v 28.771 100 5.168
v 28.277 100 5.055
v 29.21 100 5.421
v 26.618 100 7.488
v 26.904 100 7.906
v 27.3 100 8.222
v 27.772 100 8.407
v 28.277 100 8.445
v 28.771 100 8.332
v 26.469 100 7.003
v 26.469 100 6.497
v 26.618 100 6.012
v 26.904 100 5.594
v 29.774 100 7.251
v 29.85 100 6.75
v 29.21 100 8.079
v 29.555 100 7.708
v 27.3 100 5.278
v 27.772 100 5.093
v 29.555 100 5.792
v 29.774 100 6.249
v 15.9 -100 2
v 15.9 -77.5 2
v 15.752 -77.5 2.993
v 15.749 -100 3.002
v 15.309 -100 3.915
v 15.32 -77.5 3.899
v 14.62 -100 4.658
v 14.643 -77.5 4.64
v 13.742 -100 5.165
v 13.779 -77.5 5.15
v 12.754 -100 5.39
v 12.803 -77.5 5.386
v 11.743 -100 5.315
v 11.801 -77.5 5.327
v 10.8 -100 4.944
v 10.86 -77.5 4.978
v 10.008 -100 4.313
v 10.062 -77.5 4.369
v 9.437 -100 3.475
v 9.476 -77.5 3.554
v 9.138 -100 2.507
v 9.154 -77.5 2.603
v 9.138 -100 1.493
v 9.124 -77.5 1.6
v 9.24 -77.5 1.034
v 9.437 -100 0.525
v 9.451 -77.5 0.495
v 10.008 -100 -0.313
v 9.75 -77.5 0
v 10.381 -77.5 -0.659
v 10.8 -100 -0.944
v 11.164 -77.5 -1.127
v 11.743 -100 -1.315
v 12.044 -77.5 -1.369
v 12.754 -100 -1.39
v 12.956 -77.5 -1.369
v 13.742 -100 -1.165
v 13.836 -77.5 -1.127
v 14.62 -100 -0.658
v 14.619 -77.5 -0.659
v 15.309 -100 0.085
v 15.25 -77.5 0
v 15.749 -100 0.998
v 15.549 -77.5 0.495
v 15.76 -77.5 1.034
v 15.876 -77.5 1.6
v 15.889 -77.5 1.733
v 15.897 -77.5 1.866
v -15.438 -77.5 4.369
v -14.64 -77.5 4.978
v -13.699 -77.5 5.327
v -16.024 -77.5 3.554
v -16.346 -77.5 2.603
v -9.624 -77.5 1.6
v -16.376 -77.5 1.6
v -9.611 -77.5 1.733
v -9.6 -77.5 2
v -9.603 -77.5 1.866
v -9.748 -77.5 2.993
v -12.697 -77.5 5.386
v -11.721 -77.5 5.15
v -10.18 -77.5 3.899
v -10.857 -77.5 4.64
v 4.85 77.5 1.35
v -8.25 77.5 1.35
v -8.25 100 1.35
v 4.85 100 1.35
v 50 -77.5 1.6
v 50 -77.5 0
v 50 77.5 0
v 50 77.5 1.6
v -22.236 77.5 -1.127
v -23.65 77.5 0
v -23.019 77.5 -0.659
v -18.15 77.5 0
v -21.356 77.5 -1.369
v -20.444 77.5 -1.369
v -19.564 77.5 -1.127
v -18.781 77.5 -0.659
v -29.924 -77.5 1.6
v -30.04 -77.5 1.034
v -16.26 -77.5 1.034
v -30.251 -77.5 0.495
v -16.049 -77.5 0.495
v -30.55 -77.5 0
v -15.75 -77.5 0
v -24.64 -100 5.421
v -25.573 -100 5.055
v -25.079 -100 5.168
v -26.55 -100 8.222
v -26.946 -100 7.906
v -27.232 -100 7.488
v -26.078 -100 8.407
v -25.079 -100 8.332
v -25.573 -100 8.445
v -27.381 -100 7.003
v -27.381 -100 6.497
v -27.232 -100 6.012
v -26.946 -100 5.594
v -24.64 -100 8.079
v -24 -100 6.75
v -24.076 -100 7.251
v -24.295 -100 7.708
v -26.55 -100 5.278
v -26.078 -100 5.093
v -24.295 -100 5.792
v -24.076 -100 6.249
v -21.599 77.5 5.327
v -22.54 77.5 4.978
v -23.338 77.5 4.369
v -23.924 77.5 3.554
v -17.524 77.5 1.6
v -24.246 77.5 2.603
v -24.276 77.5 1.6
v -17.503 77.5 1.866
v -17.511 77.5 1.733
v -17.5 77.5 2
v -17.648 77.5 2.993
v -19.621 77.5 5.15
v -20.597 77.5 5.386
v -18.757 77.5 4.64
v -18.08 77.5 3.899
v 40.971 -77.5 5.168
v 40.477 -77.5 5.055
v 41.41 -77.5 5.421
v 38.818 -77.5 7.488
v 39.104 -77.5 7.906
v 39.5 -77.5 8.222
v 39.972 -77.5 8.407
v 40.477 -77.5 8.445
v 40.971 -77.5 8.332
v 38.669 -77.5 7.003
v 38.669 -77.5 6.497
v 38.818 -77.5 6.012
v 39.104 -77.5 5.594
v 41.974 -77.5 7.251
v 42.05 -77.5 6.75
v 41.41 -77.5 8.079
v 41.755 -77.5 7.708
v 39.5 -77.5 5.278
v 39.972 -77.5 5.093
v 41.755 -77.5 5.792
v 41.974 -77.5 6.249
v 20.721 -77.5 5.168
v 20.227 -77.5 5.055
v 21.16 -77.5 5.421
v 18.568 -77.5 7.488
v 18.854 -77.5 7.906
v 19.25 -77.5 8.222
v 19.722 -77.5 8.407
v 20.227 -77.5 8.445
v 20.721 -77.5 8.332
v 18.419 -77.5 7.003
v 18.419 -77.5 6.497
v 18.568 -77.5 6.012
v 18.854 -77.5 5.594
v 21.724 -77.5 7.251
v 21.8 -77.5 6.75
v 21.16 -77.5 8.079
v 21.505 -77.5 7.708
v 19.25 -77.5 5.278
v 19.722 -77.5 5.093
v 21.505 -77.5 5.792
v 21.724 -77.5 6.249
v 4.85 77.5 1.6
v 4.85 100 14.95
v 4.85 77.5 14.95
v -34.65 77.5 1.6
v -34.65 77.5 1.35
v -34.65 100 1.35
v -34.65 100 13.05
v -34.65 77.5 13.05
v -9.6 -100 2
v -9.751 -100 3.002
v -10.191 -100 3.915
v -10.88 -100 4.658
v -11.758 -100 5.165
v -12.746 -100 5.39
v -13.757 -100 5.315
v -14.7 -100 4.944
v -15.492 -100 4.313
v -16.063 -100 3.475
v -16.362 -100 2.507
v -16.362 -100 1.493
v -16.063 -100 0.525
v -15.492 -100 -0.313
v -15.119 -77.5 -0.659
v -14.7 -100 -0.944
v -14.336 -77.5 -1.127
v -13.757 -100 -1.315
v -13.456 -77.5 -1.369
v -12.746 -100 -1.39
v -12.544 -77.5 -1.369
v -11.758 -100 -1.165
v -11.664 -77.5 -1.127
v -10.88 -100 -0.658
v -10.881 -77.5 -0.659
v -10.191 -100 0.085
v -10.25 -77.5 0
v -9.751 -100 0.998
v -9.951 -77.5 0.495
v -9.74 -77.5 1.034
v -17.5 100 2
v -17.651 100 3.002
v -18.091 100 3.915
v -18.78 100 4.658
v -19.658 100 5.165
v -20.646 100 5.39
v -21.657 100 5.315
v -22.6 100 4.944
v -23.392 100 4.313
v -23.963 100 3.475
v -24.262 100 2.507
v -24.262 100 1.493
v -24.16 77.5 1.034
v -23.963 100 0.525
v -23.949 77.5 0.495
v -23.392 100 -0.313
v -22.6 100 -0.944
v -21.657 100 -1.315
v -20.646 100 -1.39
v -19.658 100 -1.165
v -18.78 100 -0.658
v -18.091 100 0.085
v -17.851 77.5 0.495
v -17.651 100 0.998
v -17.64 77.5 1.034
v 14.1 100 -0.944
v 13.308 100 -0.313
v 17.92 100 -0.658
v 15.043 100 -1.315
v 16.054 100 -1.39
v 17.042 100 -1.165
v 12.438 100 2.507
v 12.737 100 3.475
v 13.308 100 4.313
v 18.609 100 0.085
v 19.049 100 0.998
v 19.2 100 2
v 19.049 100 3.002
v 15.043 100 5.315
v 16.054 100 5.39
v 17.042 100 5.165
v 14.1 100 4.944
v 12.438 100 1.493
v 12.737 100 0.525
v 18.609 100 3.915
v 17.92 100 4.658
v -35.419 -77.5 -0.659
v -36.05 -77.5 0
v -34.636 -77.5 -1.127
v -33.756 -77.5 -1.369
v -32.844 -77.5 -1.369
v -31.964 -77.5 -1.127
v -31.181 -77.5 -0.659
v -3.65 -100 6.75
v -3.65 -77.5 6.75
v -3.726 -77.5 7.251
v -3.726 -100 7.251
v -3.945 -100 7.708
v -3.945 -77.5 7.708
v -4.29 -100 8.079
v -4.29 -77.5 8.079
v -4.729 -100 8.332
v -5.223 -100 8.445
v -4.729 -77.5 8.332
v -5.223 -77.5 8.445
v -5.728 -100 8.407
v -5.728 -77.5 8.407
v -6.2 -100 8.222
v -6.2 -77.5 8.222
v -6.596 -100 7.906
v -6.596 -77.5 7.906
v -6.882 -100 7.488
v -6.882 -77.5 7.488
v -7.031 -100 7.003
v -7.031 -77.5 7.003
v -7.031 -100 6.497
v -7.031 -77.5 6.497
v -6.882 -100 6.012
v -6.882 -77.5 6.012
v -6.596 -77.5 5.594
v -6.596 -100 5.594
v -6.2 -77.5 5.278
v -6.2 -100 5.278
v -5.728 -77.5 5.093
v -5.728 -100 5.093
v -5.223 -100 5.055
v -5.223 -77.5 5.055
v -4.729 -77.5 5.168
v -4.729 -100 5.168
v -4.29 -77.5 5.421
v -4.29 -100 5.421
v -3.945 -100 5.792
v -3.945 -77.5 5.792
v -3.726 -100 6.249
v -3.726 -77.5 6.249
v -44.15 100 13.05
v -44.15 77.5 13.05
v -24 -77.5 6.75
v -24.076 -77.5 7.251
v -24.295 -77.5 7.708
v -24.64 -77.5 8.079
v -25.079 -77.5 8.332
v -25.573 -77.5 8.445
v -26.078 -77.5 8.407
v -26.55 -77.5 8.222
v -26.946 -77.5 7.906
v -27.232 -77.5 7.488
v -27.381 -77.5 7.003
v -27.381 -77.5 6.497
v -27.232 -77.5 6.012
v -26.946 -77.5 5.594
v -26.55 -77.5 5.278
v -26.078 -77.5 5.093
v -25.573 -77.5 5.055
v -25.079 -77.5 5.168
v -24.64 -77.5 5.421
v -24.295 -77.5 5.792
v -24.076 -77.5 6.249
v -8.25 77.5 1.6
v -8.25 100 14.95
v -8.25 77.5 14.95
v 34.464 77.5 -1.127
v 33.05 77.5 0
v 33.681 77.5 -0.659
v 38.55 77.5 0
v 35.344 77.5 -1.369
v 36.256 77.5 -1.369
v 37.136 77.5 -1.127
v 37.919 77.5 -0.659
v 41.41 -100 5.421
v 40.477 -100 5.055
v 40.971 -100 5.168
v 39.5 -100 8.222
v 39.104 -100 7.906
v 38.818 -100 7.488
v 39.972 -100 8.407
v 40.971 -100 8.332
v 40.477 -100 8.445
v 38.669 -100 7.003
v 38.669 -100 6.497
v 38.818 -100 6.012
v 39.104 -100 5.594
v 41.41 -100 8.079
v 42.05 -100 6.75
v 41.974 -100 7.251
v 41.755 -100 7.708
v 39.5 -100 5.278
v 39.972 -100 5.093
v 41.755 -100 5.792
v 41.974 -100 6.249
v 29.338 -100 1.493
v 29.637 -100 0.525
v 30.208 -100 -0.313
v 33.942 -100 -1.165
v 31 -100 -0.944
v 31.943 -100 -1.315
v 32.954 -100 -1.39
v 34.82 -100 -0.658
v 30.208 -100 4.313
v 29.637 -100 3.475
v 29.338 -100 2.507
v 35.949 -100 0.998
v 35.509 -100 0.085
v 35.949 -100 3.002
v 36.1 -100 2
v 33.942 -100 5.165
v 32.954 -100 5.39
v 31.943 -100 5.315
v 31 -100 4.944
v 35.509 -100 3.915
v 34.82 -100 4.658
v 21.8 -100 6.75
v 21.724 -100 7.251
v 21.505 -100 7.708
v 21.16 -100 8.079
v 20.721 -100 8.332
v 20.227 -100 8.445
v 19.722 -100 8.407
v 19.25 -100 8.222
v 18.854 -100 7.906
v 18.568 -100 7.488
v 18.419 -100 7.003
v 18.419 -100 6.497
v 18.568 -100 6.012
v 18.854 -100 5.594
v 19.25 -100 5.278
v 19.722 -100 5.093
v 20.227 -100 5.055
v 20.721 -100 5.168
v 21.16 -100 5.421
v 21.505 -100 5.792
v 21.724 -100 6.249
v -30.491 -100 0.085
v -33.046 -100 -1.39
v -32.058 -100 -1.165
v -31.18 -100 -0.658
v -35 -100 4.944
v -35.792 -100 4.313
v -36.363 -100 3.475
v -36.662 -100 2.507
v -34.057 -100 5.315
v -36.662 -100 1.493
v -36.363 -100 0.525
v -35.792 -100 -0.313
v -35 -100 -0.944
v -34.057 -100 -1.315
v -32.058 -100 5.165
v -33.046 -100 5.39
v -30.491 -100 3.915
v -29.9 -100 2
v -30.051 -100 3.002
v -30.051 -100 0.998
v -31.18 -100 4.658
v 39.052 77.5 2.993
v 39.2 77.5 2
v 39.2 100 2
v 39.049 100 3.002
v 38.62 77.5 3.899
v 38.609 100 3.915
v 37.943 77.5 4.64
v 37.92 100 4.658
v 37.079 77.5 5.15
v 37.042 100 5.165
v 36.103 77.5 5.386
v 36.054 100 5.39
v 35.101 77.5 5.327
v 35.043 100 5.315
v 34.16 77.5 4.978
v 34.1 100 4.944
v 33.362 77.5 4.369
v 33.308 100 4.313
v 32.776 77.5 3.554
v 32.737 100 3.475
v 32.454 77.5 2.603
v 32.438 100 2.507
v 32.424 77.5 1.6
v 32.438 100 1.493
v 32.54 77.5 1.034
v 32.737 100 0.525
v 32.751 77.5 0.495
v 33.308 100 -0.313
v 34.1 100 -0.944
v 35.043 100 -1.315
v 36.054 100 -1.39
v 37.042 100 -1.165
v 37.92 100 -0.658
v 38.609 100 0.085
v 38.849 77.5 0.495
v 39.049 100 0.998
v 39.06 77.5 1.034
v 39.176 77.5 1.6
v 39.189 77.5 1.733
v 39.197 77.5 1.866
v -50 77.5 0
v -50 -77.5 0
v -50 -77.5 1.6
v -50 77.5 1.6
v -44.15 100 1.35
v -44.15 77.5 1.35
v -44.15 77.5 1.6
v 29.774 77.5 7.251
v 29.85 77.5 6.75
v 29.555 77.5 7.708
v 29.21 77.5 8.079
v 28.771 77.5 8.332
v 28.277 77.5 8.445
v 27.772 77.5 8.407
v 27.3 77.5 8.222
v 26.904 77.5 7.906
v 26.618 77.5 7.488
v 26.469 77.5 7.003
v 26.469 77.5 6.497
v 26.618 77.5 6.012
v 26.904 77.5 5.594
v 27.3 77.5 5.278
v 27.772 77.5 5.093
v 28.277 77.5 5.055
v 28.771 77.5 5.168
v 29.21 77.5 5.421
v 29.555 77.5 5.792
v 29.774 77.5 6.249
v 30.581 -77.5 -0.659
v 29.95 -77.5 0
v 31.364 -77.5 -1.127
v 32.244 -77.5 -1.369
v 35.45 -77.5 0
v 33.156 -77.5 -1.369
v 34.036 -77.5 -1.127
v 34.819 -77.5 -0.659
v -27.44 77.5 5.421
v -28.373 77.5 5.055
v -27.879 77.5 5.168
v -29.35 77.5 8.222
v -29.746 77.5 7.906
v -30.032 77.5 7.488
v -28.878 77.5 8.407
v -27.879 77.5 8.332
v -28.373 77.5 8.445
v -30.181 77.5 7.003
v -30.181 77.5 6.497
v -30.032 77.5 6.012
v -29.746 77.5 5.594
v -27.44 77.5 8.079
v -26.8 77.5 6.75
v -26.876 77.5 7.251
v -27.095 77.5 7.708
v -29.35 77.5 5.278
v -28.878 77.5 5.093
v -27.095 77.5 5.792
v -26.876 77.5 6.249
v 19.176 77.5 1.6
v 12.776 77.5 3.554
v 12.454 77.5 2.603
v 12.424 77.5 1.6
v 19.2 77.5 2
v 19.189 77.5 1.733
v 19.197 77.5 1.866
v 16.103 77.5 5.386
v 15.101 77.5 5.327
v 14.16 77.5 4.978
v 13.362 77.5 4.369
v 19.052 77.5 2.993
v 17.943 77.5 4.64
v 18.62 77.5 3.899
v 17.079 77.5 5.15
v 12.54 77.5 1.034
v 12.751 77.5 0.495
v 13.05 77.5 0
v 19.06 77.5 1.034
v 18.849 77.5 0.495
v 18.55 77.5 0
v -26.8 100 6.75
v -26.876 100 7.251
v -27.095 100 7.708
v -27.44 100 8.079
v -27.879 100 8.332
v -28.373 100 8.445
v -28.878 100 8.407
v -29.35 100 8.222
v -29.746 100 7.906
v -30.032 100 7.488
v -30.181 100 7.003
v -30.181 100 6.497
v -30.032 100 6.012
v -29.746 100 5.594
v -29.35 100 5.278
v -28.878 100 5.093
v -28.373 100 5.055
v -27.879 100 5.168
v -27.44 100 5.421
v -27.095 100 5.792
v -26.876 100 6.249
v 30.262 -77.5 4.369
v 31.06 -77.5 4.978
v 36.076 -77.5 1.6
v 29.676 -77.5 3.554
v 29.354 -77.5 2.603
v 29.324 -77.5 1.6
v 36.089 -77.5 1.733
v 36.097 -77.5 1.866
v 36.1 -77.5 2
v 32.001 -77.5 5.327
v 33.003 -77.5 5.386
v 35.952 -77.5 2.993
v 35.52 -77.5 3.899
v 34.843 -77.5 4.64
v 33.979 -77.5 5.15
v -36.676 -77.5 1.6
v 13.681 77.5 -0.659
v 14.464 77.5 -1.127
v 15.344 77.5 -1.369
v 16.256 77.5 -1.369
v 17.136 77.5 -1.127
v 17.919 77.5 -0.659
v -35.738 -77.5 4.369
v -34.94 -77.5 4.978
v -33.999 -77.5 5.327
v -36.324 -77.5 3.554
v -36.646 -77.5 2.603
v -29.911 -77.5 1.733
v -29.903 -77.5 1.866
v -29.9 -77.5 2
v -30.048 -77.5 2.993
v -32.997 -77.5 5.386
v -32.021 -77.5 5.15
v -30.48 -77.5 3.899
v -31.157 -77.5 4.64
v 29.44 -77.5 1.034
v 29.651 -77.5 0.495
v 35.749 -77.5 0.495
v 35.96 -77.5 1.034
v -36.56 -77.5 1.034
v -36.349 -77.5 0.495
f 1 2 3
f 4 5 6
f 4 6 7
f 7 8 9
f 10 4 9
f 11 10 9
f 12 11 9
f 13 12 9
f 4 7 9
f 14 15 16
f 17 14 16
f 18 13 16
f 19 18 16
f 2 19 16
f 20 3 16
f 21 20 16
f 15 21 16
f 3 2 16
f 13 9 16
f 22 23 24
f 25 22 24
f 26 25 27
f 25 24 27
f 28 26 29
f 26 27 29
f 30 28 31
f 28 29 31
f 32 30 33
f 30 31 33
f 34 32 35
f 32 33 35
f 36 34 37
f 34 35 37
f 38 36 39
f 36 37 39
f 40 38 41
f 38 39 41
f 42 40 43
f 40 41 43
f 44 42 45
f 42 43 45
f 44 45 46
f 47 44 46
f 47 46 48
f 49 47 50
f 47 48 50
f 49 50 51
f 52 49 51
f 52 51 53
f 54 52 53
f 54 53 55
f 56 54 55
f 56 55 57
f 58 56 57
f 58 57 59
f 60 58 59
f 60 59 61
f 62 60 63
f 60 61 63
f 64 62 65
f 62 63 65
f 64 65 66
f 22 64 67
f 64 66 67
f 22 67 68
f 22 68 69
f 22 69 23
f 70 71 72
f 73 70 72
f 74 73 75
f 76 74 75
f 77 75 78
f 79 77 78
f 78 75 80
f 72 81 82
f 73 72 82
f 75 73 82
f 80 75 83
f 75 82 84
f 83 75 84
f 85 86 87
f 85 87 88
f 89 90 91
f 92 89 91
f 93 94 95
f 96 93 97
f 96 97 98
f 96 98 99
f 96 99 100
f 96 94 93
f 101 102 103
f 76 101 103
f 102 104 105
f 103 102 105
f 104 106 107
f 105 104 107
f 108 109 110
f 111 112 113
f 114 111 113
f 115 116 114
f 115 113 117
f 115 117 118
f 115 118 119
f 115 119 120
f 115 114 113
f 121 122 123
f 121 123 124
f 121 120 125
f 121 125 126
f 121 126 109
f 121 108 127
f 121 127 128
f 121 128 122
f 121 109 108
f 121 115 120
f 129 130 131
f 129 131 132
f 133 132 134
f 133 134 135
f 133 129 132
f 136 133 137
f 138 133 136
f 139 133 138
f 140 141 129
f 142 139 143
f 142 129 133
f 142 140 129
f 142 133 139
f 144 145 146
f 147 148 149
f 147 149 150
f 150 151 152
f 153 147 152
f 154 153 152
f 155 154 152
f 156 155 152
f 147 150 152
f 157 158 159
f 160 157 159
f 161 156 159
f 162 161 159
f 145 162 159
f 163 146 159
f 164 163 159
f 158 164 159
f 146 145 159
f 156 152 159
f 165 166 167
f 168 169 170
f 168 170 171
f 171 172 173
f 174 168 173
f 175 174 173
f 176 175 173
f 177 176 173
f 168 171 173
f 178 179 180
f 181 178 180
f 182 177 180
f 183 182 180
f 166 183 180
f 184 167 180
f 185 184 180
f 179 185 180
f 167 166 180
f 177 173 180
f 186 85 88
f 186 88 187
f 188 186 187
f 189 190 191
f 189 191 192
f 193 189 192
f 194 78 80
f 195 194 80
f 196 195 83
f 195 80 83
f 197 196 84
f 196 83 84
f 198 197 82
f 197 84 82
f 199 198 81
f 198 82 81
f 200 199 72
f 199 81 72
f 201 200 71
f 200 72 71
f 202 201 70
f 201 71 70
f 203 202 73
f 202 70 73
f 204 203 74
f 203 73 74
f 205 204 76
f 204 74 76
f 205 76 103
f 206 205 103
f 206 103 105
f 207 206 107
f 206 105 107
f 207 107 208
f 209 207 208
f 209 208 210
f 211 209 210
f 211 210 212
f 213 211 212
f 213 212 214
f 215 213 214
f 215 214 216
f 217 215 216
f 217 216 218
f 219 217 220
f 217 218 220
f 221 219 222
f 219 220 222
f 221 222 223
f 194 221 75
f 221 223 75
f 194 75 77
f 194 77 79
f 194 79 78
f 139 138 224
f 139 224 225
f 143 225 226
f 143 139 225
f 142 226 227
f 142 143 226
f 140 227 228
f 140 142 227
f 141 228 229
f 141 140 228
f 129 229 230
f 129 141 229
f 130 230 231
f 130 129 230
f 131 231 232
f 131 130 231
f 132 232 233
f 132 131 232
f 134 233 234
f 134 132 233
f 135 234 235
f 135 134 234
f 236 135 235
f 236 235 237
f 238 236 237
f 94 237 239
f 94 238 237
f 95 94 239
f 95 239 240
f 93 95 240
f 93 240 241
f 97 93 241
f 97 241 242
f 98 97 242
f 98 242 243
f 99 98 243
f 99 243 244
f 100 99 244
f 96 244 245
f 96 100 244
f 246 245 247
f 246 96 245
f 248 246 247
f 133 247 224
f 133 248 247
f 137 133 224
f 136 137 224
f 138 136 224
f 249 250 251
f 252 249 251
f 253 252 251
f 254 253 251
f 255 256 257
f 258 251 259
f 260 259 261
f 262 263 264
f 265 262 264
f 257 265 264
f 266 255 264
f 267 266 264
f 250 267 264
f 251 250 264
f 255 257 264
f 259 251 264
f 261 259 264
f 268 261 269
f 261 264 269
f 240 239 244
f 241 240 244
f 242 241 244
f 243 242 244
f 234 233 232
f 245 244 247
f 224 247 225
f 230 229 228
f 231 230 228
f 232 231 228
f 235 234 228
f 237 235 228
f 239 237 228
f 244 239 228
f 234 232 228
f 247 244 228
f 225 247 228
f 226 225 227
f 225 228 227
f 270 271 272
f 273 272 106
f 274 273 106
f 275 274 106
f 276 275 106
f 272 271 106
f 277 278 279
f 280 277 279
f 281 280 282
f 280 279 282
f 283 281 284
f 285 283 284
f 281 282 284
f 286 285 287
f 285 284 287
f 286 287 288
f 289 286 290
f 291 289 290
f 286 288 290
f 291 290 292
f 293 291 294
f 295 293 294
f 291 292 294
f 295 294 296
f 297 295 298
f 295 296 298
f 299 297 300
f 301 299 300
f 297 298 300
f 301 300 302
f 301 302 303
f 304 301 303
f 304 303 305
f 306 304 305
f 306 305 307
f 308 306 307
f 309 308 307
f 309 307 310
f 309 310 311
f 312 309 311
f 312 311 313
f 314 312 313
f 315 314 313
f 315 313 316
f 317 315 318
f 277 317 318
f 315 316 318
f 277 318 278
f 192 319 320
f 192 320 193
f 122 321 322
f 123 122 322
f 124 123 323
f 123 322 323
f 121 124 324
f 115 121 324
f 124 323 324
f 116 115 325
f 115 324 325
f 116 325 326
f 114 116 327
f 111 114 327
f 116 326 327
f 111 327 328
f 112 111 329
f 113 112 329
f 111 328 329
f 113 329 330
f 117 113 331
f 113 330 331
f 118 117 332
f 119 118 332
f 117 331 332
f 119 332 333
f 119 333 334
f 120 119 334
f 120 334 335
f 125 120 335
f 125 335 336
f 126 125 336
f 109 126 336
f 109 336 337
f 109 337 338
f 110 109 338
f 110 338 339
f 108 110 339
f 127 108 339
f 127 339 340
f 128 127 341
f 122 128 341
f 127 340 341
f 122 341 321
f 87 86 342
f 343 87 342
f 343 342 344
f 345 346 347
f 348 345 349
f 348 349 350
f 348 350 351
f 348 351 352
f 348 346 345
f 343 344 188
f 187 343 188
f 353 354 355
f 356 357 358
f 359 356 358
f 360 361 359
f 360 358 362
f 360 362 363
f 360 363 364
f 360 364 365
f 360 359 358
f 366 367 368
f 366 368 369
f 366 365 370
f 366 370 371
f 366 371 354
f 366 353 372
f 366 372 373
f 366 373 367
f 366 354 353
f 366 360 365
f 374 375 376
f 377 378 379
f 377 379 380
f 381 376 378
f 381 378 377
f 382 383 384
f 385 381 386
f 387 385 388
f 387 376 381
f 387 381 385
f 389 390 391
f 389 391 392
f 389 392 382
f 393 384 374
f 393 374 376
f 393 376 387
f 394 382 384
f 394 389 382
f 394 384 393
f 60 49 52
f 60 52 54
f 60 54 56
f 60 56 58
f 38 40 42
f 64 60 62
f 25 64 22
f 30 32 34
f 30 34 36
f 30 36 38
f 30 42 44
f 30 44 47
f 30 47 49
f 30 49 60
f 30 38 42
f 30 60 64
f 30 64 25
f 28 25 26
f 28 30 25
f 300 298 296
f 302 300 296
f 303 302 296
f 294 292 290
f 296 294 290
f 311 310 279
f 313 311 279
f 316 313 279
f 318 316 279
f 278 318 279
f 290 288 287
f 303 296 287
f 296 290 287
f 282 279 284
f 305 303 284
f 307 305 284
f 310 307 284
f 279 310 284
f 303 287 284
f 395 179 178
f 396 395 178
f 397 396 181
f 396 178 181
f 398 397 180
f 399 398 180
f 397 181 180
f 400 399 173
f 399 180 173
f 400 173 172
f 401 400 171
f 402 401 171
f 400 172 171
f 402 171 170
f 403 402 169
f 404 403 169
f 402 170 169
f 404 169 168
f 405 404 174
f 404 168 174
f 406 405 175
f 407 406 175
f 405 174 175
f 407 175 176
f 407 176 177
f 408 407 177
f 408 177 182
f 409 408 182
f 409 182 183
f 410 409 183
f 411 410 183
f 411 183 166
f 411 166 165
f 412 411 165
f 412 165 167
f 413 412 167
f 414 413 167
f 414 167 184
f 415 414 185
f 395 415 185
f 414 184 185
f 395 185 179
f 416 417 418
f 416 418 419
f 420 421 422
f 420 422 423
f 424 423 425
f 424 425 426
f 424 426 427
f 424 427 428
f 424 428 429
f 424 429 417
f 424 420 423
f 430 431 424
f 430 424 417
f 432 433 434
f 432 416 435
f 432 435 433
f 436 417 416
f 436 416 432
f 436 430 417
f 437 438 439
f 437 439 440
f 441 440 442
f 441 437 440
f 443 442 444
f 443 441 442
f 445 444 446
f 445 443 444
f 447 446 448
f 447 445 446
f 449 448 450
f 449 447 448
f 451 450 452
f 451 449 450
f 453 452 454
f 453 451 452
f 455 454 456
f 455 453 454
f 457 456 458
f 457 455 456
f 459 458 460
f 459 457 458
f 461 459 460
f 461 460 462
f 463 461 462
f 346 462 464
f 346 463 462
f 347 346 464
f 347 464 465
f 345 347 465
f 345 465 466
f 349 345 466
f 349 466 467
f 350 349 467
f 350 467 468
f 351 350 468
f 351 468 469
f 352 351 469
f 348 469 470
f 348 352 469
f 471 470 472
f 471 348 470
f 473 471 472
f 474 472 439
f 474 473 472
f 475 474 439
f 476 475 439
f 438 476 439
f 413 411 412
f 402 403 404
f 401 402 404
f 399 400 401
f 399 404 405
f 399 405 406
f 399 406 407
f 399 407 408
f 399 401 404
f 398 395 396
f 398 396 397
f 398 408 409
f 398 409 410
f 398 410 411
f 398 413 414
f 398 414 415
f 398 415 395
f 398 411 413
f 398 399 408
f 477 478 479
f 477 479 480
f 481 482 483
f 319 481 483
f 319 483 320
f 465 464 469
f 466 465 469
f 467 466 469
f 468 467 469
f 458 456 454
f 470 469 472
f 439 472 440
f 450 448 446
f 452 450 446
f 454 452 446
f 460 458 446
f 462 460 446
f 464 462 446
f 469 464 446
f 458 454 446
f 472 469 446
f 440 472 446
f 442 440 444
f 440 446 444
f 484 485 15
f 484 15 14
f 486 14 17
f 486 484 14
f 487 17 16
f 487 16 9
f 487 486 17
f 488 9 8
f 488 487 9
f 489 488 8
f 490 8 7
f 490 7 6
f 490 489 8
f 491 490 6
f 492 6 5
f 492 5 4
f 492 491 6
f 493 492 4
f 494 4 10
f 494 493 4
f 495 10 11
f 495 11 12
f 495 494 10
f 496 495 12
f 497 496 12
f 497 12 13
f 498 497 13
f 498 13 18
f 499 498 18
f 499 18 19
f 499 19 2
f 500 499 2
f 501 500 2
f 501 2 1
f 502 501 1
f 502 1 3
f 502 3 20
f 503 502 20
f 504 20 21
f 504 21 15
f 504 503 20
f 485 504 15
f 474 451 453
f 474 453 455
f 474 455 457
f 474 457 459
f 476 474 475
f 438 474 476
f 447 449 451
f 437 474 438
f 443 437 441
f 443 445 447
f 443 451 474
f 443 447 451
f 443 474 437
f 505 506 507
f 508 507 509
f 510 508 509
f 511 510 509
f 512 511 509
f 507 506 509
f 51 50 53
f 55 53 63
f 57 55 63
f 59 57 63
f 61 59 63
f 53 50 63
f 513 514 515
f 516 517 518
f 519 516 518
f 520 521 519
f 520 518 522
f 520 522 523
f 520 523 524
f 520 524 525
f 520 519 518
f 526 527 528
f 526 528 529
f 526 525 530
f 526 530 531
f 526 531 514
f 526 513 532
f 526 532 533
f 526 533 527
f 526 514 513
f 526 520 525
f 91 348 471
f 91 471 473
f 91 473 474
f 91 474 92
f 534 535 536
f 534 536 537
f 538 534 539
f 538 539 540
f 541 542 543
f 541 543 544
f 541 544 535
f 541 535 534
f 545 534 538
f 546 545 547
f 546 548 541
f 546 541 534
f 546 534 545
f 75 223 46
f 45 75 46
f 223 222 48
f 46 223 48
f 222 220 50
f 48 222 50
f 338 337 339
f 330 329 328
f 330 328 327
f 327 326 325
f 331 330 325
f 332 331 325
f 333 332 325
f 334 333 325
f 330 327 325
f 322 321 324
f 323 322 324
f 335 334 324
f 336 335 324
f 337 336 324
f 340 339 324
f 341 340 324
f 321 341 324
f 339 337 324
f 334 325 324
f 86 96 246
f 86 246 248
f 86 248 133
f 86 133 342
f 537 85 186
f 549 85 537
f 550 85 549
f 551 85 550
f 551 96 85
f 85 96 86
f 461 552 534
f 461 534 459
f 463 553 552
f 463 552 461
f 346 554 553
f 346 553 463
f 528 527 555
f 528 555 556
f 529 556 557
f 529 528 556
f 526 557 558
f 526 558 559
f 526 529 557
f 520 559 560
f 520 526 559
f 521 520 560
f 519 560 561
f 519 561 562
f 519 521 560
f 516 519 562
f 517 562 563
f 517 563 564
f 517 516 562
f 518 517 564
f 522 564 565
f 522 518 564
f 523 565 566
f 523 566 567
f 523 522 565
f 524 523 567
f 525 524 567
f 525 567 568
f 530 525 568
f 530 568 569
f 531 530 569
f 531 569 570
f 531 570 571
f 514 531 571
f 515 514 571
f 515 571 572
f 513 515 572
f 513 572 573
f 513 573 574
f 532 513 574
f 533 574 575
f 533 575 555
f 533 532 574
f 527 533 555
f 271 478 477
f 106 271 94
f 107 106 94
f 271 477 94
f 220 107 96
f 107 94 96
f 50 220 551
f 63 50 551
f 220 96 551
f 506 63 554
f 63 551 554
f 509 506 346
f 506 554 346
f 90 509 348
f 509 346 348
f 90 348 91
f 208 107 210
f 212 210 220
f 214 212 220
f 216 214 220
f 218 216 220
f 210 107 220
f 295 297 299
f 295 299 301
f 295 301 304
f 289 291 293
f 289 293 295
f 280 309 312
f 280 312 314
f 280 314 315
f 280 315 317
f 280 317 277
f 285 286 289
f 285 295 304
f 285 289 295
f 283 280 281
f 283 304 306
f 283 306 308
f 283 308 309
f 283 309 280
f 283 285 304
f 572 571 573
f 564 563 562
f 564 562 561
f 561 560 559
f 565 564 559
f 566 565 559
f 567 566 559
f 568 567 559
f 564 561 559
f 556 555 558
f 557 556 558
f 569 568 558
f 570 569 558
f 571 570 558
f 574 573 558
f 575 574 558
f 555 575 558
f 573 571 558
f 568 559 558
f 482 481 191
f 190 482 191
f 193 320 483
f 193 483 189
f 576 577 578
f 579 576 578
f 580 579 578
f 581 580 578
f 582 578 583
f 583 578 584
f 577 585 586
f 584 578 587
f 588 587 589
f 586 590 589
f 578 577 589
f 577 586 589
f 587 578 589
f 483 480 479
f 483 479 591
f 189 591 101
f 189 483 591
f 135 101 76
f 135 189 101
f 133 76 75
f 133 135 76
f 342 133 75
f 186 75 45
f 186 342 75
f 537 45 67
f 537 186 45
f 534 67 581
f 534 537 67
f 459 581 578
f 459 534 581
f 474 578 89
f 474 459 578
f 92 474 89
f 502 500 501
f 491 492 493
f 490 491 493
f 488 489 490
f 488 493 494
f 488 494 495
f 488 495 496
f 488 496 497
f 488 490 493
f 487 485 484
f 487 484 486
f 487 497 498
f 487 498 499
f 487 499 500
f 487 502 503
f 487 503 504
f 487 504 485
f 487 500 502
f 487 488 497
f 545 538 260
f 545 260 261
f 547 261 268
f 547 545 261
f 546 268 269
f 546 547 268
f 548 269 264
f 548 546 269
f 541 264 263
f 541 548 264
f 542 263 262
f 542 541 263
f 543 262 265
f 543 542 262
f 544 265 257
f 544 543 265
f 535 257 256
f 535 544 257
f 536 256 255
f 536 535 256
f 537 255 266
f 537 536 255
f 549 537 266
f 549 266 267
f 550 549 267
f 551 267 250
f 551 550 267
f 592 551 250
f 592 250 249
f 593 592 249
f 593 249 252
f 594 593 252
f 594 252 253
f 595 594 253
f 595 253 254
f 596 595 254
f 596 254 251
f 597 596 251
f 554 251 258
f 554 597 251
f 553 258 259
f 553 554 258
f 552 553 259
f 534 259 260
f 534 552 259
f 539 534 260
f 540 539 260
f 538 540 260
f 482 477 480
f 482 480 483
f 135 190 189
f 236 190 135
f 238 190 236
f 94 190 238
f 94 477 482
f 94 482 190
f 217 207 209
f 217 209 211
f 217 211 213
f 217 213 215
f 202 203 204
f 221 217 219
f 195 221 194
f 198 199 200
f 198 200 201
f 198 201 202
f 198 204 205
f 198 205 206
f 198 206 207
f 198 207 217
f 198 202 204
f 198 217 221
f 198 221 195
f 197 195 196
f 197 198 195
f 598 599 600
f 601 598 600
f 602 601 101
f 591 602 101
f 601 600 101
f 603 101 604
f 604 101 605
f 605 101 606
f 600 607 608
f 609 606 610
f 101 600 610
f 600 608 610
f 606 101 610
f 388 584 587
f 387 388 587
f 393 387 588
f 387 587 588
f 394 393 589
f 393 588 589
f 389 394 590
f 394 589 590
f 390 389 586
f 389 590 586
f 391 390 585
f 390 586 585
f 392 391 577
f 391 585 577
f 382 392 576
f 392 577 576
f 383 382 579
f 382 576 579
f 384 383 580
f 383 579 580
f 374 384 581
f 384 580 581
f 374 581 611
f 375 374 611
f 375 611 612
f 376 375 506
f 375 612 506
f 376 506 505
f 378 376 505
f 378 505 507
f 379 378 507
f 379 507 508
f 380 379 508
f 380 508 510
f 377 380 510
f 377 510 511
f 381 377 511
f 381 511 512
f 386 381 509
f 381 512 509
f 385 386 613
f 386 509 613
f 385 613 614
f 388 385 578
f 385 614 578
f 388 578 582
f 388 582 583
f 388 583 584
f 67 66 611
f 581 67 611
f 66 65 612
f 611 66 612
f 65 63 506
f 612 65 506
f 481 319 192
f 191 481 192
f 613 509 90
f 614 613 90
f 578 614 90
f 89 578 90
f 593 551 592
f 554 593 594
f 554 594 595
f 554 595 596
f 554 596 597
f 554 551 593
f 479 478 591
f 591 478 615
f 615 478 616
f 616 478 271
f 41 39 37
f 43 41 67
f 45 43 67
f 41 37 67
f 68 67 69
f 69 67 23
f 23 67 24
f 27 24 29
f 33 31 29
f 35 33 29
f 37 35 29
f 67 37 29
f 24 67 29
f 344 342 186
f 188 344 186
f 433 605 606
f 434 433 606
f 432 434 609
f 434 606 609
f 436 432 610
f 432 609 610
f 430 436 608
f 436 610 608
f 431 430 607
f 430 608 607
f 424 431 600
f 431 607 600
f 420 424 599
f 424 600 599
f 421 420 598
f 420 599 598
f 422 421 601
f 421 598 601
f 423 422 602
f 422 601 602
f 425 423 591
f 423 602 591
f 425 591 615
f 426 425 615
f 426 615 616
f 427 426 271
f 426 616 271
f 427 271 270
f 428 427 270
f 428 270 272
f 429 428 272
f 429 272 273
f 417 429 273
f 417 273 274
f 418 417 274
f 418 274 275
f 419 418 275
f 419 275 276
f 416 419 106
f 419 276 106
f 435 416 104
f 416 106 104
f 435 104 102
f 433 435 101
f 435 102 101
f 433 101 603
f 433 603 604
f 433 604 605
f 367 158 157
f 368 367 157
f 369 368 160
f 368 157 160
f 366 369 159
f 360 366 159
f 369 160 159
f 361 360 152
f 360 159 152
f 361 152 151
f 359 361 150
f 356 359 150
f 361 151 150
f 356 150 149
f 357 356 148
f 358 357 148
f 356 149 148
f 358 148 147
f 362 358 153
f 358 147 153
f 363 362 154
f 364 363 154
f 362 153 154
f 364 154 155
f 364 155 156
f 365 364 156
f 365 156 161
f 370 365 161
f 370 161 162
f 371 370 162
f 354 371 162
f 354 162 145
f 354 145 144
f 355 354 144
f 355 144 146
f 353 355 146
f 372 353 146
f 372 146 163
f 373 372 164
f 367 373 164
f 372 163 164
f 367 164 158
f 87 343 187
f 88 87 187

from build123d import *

# Parameters (mm, degrees)
F2_W     = 100
F2_H     = 155
F3_DEPTH = 1.6
F4_START = 77.5
F0_R     = 3.4
F4_DEPTH = 22.5
F0_R_2   = 1.7
F5_START = -77.5
F1_R     = 1.7
F5_DEPTH = 22.5
F1_R_2   = 3.4
F1_W     = 13.1
F1_H     = 13.6
F1_W_2   = 9.5
F1_H_2   = 11.7


with BuildPart() as f3:
    # F2 (on Top) → F3 (new body, through all)
    with BuildSketch(Plane.XY):
        Rectangle(F2_W, F2_H)
    extrude(amount=F3_DEPTH)

    # F0 (on Front) → F4 (join)
    with BuildSketch(Plane.XZ.offset(F4_START)):
        with Locations((-33.3, 2)):
            Circle(F0_R)
        with Locations((-13, 2)):
            Circle(F0_R)
        with Locations((12.5, 2)):
            Circle(F0_R)
        with Locations((32.7, 2)):
            Circle(F0_R)
    extrude(amount=F4_DEPTH)

    # F1 (on Front) → F5, piece 3 (join)
    with BuildSketch(Plane.XZ.offset(F5_START)):
        with Locations((35.8, 2)):
            Circle(F1_R_2)
        with Locations((15.8, 2)):
            Circle(F1_R_2)
        with Locations((-20.9, 2)):
            Circle(F1_R_2)
        with Locations((-1.7, 8.15)):
            Rectangle(F1_W, F1_H)
        with Locations((-39.4, 7.2)):
            Rectangle(F1_W_2, F1_H_2)
    extrude(amount=-F5_DEPTH)


with BuildPart() as f4:
    # F0 (on Front) → F4, piece 2 (new body)
    with BuildSketch(Plane.XZ.offset(F4_START)):
        with Locations((-25.7, 6.75)):
            Circle(F0_R_2)
    extrude(amount=F4_DEPTH)


with BuildPart() as f4b:
    # F0 (on Front) → F4, piece 3 (new body)
    with BuildSketch(Plane.XZ.offset(F4_START)):
        with Locations((-5.35, 6.75)):
            Circle(F0_R_2)
    extrude(amount=F4_DEPTH)


with BuildPart() as f4c:
    # F0 (on Front) → F4, piece 4 (new body)
    with BuildSketch(Plane.XZ.offset(F4_START)):
        with Locations((20.1, 6.75)):
            Circle(F0_R_2)
    extrude(amount=F4_DEPTH)


with BuildPart() as f4d:
    # F0 (on Front) → F4, piece 5 (new body)
    with BuildSketch(Plane.XZ.offset(F4_START)):
        with Locations((40.35, 6.75)):
            Circle(F0_R_2)
    extrude(amount=F4_DEPTH)


with BuildPart() as f5:
    # F1 (on Front) → F5 (new body)
    with BuildSketch(Plane.XZ.offset(F5_START)):
        with Locations((28.15, 6.75)):
            Circle(F1_R)
    extrude(amount=-F5_DEPTH)


with BuildPart() as f5b:
    # F1 (on Front) → F5, piece 2 (new body)
    with BuildSketch(Plane.XZ.offset(F5_START)):
        with Locations((-28.5, 6.75)):
            Circle(F1_R)
    extrude(amount=-F5_DEPTH)


solid = Compound([f3.part, f4.part, f4b.part, f4c.part, f4d.part, f5.part, f5b.part])
